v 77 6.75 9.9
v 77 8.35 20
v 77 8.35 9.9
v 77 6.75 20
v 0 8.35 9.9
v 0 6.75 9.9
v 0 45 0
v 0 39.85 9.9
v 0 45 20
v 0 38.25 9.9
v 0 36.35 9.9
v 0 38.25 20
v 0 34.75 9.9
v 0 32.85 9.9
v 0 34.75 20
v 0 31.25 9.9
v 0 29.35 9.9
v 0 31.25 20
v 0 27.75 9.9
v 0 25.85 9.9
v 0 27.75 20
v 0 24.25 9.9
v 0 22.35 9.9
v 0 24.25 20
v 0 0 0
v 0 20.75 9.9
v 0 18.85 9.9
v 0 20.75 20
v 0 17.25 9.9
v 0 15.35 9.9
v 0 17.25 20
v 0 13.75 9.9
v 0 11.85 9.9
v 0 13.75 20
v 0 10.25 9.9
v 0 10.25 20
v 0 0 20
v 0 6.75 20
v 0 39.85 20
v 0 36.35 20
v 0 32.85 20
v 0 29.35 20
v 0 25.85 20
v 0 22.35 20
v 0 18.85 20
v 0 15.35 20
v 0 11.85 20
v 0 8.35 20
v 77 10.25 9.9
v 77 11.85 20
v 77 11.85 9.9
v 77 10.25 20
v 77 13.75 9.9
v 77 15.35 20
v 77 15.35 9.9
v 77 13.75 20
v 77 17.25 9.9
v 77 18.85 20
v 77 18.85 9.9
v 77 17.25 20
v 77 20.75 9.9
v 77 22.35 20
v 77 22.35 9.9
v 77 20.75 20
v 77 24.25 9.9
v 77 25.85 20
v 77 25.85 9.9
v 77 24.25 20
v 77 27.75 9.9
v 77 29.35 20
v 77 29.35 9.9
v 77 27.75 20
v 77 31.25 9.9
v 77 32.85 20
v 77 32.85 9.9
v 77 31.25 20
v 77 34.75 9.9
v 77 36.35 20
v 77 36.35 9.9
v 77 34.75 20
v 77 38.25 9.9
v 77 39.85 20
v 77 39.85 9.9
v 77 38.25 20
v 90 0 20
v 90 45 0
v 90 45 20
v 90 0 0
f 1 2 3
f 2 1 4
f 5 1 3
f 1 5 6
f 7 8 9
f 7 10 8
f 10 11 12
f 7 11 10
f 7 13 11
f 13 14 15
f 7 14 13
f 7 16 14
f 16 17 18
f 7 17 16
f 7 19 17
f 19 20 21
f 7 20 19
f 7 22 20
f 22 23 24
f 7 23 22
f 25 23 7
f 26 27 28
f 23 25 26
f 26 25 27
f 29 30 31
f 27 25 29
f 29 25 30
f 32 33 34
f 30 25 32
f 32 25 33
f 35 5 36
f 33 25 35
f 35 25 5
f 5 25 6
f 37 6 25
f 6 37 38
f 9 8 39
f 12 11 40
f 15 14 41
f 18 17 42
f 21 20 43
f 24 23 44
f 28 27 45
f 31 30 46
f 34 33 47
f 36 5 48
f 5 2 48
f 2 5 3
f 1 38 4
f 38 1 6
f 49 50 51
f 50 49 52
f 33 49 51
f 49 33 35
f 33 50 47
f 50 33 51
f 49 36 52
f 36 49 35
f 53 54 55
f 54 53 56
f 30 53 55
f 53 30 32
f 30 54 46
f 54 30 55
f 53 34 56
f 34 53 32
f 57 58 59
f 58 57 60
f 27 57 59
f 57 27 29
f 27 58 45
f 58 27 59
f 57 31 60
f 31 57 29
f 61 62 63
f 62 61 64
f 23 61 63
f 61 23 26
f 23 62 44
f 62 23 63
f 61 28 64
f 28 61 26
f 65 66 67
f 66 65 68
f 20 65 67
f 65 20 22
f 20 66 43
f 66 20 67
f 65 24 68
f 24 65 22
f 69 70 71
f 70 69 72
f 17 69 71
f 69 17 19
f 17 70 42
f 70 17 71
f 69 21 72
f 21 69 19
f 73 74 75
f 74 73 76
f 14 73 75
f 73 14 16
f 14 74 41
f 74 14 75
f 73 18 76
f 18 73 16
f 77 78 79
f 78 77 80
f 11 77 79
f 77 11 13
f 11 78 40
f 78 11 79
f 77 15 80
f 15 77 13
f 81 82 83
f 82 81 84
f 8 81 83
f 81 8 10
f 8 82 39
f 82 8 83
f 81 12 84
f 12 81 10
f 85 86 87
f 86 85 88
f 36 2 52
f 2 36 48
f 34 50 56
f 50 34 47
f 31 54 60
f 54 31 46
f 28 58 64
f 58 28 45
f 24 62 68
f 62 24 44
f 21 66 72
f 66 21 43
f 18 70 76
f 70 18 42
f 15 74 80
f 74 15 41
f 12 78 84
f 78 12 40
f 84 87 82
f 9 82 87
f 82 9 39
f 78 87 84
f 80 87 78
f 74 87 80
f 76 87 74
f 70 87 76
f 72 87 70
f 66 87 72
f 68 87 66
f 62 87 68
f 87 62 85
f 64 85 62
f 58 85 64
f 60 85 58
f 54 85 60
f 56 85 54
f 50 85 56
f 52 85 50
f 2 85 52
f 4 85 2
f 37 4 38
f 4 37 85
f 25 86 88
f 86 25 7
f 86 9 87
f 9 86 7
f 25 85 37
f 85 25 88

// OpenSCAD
$fn = 64;

// Dimensions (mm)
block_x = 90;
block_y = 45;
block_z = 20;
slot_length = 77;
slot_width = 1.6;
slot_depth = 10;
slot_spacing = 3.5;
num_slots = 10;

// Calculations for centering the slots
// To center the group of slots, the first slot center is offset from the block center
// by half the total span of the slots (which is (num_slots - 1) * spacing)
total_span = (num_slots - 1) * slot_spacing;
first_slot_y = (block_y / 2) - (total_span / 2);

module rack() {
    difference() {
        // Base Block
        cube([block_x, block_y, block_z], center=false);

        // Slots
        for (i = [0 : num_slots - 1]) {
            // Calculate Y position for this slot
            current_y = first_slot_y + (i * slot_spacing);

            // The cutting shape (void)
            // We extend the depth by 0.2mm to ensure it cuts past the top face
            // (0.1mm to cut through the slot, 0.1mm to clear the top face)
            void_depth = slot_depth + 0.2;
            
            // Position the cube so it starts slightly below the slot bottom
            // and extends 0.1mm above the top face of the block
            translate([0, current_y, block_z - void_depth + 0.1])
                cube([slot_length, slot_width, void_depth], center=false);
        }
    }
}

rack();
